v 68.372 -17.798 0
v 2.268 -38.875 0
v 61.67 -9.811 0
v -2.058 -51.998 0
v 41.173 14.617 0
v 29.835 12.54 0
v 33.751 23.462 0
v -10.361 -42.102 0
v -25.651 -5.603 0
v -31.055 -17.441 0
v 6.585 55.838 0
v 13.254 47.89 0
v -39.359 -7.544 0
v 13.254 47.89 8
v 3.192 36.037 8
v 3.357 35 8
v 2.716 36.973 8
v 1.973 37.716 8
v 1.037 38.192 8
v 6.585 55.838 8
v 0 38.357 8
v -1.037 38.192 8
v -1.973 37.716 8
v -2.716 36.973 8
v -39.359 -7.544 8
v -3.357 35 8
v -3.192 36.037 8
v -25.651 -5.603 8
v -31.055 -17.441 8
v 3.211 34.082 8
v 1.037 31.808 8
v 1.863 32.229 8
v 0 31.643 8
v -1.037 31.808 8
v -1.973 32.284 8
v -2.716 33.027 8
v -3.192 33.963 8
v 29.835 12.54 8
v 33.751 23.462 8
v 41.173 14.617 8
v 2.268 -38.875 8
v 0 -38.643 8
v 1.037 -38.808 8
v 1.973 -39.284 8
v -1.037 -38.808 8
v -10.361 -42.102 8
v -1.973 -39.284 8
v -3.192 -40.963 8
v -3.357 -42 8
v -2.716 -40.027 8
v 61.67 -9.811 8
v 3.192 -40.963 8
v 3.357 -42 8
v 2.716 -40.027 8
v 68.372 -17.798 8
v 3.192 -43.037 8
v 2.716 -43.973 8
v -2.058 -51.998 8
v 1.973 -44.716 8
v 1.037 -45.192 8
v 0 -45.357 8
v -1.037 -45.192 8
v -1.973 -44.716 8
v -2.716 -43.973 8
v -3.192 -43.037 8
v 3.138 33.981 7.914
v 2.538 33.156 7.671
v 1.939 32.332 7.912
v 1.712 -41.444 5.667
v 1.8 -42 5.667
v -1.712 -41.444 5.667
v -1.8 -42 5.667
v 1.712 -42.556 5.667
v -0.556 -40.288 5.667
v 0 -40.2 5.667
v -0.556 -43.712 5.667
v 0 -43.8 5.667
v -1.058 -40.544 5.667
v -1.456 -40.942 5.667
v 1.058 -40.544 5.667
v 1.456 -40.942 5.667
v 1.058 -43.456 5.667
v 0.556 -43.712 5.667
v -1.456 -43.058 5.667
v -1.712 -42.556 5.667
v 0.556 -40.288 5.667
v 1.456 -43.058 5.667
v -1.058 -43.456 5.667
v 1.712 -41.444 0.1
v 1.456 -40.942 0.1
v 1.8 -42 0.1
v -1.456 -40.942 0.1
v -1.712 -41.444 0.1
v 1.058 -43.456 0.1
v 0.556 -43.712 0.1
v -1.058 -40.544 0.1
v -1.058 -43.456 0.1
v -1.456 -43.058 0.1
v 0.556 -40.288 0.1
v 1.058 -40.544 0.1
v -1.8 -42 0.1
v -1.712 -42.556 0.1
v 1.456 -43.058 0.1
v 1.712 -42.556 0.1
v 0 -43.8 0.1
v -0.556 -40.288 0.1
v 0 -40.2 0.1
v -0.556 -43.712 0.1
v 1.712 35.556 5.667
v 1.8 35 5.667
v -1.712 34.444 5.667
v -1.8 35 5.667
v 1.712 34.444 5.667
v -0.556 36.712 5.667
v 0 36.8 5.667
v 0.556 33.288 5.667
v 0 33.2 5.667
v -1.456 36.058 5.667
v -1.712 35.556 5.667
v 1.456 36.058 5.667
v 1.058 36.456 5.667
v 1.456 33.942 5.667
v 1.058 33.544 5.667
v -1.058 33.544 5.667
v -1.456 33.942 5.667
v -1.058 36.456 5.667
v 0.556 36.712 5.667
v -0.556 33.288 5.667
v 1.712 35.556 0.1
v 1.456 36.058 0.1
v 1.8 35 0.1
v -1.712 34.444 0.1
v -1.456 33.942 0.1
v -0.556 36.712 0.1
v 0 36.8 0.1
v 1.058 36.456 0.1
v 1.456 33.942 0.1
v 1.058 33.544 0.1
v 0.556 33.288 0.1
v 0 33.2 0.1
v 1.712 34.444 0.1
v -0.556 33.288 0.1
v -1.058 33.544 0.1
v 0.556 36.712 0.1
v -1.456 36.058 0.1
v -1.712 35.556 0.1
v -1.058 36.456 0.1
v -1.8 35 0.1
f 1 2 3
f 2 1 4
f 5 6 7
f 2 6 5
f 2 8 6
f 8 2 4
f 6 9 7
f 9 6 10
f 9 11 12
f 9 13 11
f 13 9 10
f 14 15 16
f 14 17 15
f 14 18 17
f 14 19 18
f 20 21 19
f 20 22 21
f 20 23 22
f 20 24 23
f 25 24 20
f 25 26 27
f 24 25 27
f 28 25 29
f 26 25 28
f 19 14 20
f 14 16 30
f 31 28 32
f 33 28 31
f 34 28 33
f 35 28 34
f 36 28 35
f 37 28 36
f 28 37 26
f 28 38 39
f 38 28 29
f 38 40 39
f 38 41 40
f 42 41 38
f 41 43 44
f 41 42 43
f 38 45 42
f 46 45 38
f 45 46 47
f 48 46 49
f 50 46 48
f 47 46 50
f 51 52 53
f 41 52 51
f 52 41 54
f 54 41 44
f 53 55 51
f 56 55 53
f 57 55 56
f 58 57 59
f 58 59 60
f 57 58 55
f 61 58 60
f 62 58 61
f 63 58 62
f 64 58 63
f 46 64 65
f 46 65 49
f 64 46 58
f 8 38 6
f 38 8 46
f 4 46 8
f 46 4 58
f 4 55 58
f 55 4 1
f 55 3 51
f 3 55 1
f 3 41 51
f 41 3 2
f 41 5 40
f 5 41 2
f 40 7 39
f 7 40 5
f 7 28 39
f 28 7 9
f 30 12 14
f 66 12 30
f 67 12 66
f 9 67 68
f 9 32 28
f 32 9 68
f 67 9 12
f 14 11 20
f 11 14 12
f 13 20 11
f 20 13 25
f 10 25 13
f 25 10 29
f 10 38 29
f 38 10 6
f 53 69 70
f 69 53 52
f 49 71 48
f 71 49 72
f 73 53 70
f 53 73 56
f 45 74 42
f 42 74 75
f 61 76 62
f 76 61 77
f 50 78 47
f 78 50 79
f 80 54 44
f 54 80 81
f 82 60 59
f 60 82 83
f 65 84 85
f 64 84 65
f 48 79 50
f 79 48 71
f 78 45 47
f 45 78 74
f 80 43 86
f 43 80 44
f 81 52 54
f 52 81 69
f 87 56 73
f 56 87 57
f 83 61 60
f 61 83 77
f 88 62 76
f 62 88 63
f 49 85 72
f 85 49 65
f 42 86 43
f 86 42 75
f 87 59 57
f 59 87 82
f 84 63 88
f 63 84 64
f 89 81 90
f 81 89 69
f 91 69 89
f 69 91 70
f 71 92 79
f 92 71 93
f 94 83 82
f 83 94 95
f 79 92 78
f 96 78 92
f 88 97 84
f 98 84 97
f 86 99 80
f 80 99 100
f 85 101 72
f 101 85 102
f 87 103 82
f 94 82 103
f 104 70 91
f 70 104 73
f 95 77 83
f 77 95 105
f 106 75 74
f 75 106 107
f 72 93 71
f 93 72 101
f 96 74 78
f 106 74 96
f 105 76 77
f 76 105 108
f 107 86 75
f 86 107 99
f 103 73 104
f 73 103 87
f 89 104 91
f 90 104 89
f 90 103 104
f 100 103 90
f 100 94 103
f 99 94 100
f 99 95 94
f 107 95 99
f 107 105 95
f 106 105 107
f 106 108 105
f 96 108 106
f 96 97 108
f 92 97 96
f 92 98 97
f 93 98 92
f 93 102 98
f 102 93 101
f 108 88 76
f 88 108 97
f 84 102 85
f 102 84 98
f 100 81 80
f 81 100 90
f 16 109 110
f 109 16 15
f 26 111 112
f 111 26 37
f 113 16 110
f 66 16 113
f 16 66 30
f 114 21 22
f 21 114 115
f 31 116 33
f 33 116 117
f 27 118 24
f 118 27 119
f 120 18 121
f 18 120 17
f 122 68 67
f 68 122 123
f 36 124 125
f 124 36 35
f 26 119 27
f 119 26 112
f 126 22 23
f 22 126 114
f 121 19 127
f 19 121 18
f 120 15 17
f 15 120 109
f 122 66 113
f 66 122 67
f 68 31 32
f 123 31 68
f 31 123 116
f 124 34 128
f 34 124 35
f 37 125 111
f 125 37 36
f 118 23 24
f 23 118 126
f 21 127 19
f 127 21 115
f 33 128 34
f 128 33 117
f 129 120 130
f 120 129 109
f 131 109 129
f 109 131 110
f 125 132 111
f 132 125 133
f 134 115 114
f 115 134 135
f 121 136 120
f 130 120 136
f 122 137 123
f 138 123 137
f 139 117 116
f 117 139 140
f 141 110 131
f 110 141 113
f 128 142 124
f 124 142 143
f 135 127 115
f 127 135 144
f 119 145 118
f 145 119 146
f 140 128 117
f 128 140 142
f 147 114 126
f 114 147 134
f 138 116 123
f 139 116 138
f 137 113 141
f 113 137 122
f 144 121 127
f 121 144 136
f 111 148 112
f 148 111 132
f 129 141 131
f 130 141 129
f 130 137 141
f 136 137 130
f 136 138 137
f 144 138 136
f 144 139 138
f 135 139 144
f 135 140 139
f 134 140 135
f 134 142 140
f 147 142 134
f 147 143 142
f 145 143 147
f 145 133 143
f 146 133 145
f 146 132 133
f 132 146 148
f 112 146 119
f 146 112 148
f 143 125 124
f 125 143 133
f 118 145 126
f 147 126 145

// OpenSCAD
// Street Numbers for 3D printing
// Charles Tilford, 2019
// License: CC BY-NC-SA 4.0
//   https://creativecommons.org/licenses/by-nc-sa/4.0/

char="W";     // The number/letter to print

// Units are in mm, except for height of letter

// How many inches high should letter be?
inchesHigh=3;
// How thick/deep should letter be (mm)?
depth=8;

// Character coordinates just center the letter
charX=-42;    // Character X coord
charY=-35;    // Character Y coord
topScrew=35;  // Top screw Y coord
botScrew=-42; // Bottom screw Y coord
height=8;     // Thickness of character
// Screw dimensions. Default presumes
// #6 sheet metal screw
screwWid=3.6; // Width of screw shaft
screwTop=6.78;// Width of screw head
screwCon=5.08;// Height of head 'cone'

// Font to print in. Your system needs this
// installed, of course. If changed the hole
// positions almost certainly need to be
// changed, and maybe charX/charY.
fName="Open Sans Extrabold";
// https://fonts.google.com/specimen/Open+Sans
// Designer: Steve Matteson

// Thin floor below holes. My printer was
// struggling to have the hole 'border' stick
// to the stage. Just drill/screw thru it.
holeFloor=0.1; 

// ==========================================
// ===== All values below are auto-calculated
// ==========================================

// Scaled values
scaleFactor=inchesHigh / 3;
cX=charX * scaleFactor;
cY=charY * scaleFactor;
tS=topScrew * scaleFactor;
bS=botScrew * scaleFactor;
// Where do we start drawing screw head cone?
oS=depth - (screwCon-.05);

difference() {
  // We use difference() to punch out the screw holes
  // in the character
    
  // The character itself, 8mm thick
  rotate(a=-50)
  translate([cX,cY,0])
    linear_extrude(height=depth, scale=1)
    text(char, size=(75*scaleFactor),
         $fn=100, font=fName);
    
  // Bottom screw hole
  translate([0,bS,oS]) color("red")
    cylinder(h=screwCon, d2=screwTop,
             d1=0, $fn=20);
   translate([0,bS,holeFloor])
    cylinder(h=20, d=screwWid, $fn=20);
    
  // Top screw hole
  translate([0,tS,oS]) color("red")
    cylinder(h=screwCon, d2=screwTop,
             d1=0, $fn=20);
  translate([0,tS,holeFloor])
    cylinder(h=20, d=screwWid, $fn=20);
}

// Colors are just to aid visualization of
// void spaces. $fn is "featuer number", ie how
// many polygons are devoted to object. The values
// above should be near your printing limit anyway.

// Developed in OpenSCAD
//    https://www.openscad.org/
